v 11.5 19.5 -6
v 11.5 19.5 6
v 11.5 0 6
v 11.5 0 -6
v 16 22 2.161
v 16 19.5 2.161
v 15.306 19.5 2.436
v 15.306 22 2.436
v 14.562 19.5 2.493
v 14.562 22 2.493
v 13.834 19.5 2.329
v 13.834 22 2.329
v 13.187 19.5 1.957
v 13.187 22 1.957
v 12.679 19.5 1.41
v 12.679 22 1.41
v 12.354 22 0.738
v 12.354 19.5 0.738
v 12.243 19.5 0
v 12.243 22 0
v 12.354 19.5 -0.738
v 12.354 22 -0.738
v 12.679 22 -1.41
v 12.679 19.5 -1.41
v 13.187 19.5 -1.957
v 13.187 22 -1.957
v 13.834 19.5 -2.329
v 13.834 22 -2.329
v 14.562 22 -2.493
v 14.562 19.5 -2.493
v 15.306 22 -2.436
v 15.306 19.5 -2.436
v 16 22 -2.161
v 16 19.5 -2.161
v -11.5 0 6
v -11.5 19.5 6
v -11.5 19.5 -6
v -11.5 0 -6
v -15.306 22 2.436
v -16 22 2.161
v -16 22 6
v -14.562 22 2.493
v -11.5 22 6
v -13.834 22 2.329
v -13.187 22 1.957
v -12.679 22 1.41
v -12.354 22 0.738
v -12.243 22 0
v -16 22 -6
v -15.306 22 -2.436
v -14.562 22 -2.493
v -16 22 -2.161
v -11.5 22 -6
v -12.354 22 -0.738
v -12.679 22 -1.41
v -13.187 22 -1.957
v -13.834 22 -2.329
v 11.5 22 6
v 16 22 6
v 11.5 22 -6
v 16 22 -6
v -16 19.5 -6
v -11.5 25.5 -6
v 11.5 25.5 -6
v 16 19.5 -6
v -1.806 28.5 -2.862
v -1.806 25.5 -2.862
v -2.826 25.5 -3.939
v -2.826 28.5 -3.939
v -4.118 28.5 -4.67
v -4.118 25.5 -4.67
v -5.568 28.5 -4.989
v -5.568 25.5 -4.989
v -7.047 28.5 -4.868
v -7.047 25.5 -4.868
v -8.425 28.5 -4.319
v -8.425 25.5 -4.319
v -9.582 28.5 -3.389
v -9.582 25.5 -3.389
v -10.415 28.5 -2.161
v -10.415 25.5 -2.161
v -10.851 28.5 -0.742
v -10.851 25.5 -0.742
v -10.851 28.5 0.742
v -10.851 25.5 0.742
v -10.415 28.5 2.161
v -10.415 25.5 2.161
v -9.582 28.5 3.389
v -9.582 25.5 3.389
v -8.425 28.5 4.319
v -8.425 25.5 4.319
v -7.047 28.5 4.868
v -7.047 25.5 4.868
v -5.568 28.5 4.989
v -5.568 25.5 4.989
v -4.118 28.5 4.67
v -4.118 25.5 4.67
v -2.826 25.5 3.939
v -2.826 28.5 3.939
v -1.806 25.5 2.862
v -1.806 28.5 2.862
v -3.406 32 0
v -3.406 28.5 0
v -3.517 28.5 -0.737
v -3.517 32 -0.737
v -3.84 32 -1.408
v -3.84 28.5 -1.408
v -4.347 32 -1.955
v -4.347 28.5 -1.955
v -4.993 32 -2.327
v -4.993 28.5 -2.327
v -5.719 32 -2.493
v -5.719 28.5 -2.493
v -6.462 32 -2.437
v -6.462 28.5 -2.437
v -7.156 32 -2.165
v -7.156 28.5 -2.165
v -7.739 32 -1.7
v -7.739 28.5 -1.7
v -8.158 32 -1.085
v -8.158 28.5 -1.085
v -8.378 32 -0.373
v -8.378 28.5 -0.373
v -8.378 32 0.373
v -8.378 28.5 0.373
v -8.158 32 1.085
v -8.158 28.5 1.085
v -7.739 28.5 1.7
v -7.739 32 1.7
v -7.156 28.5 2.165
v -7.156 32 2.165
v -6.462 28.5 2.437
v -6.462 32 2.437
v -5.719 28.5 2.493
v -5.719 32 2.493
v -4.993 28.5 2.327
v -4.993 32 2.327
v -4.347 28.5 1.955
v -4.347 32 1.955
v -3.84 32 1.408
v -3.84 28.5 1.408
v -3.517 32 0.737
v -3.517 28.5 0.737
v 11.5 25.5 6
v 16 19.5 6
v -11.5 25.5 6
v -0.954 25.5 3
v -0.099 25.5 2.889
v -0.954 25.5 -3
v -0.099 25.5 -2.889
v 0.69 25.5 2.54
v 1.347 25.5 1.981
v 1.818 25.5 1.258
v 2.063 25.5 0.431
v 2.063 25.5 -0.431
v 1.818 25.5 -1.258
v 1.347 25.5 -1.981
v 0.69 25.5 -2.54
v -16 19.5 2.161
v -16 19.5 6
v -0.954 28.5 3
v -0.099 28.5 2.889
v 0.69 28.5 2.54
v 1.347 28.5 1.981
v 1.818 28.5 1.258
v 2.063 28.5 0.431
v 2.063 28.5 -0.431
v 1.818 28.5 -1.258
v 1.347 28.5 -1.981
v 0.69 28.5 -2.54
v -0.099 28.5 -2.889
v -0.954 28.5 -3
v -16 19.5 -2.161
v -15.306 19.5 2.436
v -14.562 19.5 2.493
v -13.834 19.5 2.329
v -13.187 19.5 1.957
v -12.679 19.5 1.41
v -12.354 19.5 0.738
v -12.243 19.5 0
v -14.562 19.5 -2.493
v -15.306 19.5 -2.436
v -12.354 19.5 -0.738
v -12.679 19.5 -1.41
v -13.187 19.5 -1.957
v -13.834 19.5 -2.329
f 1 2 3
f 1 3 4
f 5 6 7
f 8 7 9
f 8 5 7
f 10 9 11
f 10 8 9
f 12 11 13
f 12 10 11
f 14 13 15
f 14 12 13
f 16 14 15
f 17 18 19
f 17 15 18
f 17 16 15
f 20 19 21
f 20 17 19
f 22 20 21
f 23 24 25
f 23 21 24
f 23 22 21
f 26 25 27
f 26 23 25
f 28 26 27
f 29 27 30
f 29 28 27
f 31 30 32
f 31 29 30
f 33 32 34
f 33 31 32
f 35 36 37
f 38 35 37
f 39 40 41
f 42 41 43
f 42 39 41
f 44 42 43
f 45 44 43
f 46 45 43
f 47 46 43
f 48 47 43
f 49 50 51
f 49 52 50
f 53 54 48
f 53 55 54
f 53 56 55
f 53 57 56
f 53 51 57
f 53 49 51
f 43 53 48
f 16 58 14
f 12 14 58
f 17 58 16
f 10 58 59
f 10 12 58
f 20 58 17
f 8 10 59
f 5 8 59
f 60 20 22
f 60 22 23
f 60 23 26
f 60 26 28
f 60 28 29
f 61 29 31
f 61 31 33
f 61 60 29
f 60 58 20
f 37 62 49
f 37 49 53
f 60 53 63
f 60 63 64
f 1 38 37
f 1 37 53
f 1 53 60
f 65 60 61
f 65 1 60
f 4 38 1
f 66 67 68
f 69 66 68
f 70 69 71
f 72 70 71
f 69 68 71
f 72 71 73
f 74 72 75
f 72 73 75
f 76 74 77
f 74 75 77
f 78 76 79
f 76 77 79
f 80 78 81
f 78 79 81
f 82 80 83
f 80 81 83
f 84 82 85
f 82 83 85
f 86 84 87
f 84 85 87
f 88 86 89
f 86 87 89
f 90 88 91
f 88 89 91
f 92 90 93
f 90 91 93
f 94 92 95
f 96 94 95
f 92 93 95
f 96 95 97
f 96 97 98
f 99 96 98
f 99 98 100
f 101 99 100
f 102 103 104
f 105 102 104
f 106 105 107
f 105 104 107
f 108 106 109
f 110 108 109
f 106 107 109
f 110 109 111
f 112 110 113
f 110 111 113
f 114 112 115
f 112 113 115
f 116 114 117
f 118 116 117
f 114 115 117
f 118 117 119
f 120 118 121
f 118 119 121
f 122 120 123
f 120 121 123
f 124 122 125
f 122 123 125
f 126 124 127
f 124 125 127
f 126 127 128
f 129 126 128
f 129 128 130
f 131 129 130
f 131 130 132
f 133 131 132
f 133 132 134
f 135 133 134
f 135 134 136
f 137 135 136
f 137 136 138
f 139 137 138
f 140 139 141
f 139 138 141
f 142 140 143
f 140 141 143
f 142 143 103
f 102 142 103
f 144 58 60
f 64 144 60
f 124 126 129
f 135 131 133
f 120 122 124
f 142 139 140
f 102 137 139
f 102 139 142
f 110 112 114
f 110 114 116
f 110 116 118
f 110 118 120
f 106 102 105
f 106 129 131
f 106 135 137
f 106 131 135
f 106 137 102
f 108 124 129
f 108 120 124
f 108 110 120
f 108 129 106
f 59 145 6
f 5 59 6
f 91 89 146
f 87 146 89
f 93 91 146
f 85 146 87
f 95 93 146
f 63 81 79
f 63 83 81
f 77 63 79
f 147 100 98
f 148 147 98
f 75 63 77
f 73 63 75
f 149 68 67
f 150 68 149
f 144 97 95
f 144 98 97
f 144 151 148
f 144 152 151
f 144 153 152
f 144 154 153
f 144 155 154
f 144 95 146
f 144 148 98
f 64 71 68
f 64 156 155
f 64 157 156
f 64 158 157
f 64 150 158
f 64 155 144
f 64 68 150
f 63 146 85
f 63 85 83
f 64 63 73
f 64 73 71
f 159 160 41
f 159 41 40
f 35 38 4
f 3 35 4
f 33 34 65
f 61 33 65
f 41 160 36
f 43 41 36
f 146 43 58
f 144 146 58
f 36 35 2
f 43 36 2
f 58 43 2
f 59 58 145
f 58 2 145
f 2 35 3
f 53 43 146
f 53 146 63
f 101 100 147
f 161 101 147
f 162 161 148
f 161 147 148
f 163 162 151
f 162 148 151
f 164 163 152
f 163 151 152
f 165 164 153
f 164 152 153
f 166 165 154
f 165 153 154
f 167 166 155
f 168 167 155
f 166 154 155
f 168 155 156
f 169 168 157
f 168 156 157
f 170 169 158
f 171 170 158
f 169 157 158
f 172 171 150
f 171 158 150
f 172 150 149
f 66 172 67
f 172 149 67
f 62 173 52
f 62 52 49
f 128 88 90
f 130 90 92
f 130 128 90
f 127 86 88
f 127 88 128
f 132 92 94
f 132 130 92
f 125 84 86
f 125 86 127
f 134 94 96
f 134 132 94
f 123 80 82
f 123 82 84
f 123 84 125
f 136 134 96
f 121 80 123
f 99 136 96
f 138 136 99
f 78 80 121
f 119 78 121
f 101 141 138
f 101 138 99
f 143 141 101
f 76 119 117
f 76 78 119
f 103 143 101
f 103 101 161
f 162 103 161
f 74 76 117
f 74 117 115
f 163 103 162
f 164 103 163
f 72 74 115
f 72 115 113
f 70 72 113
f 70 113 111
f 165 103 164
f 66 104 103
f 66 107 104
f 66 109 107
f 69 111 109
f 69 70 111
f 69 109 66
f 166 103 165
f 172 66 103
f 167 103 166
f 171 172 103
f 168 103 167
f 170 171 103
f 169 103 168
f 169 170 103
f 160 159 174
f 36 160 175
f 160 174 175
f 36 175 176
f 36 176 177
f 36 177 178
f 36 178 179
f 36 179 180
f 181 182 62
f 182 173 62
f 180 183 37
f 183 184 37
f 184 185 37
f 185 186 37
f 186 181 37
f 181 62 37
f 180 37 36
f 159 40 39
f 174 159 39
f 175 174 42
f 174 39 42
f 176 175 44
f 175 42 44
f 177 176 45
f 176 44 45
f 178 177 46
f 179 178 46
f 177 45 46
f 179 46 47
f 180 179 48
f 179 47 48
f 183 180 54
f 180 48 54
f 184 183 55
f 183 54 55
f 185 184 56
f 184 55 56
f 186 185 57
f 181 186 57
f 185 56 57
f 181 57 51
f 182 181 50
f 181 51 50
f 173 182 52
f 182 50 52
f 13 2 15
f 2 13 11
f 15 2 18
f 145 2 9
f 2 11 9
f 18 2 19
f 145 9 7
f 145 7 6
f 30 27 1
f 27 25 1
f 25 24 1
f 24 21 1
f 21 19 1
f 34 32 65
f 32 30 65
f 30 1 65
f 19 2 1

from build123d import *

# Parameters (mm, degrees)
CROQUIS1_W                 = 23
CROQUIS1_H                 = 12
SALIENTE_EXTRUIR1_DEPTH    = 19.5
CROQUIS2_W                 = 32
CROQUIS2_H                 = 12
SALIENTE_EXTRUIR2_DEPTH    = 2.5
CROQUIS3_W                 = 23
CROQUIS3_H                 = 12
SALIENTE_EXTRUIR3_DEPTH    = 3.5
CORTAR_EXTRUIR1_DEPTH      = 4.5
CORTAR_EXTRUIR1_DEPTH_BACK = 23
SALIENTE_EXTRUIR4_DEPTH    = 3
CROQUIS6_R                 = 2.5
SALIENTE_EXTRUIR5_DEPTH    = 3.5


with BuildPart() as part:
    # Croquis1 → Saliente-Extruir1 (new body)
    with BuildSketch(Plane(origin=(0, 0, 0), x_dir=(1, 0, 0), z_dir=(0, 1, 0))):
        Rectangle(CROQUIS1_W, CROQUIS1_H)
    extrude(amount=SALIENTE_EXTRUIR1_DEPTH)

    # Croquis2 → Saliente-Extruir2 (add)
    with BuildSketch(Plane(origin=(0, 19.5, 0), x_dir=(1, 0, 0), z_dir=(0, 1, 0))):
        Rectangle(CROQUIS2_W, CROQUIS2_H)
    extrude(amount=SALIENTE_EXTRUIR2_DEPTH)

    # Croquis3 → Saliente-Extruir3 (add)
    with BuildSketch(Plane(origin=(0, 22, 0), x_dir=(1, 0, 0), z_dir=(0, 1, 0))):
        Rectangle(CROQUIS3_W, CROQUIS3_H)
    extrude(amount=SALIENTE_EXTRUIR3_DEPTH)

    # Croquis4 → Cortar-Extruir1 (cut, two sides)
    with BuildSketch(Plane(origin=(0, 22, 0), x_dir=(1, 0, 0), z_dir=(0, 1, 0))) as cortar_extruir1_sk:
        with BuildLine():
            Line((-16, 2.161008353), (-16, -2.161008353))
            ThreePointArc((-16, -2.161008353), (-12.243002427, 0), (-16, 2.161008353))
        make_face()
        with BuildLine():
            Line((16, 2.161008353), (16, -2.161008353))
            ThreePointArc((16, -2.161008353), (12.243002427, 0), (16, 2.161008353))
        make_face()
    extrude(amount=CORTAR_EXTRUIR1_DEPTH, mode=Mode.SUBTRACT)
    extrude(cortar_extruir1_sk.sketch, amount=-CORTAR_EXTRUIR1_DEPTH_BACK, mode=Mode.SUBTRACT)

    # Croquis5 → Saliente-Extruir4 (add)
    with BuildSketch(Plane(origin=(0, 25.5, 0), x_dir=(1, 0, 0), z_dir=(0, 1, 0))):
        with BuildLine():
            ThreePointArc((-1.805877758, 2.861817604), (-10.905877758, 0), (-1.805877758, -2.861817604))
            ThreePointArc((-1.805877758, -2.861817604), (2.094122242, 0), (-1.805877758, 2.861817604))
        make_face()
    extrude(amount=SALIENTE_EXTRUIR4_DEPTH)

    # Croquis6 → Saliente-Extruir5 (add)
    with BuildSketch(Plane(origin=(0, 28.5, 0), x_dir=(1, 0, 0), z_dir=(0, 1, 0))):
        with Locations((-5.905877758, 0)):
            Circle(CROQUIS6_R)
    extrude(amount=SALIENTE_EXTRUIR5_DEPTH)


solid = part.part
